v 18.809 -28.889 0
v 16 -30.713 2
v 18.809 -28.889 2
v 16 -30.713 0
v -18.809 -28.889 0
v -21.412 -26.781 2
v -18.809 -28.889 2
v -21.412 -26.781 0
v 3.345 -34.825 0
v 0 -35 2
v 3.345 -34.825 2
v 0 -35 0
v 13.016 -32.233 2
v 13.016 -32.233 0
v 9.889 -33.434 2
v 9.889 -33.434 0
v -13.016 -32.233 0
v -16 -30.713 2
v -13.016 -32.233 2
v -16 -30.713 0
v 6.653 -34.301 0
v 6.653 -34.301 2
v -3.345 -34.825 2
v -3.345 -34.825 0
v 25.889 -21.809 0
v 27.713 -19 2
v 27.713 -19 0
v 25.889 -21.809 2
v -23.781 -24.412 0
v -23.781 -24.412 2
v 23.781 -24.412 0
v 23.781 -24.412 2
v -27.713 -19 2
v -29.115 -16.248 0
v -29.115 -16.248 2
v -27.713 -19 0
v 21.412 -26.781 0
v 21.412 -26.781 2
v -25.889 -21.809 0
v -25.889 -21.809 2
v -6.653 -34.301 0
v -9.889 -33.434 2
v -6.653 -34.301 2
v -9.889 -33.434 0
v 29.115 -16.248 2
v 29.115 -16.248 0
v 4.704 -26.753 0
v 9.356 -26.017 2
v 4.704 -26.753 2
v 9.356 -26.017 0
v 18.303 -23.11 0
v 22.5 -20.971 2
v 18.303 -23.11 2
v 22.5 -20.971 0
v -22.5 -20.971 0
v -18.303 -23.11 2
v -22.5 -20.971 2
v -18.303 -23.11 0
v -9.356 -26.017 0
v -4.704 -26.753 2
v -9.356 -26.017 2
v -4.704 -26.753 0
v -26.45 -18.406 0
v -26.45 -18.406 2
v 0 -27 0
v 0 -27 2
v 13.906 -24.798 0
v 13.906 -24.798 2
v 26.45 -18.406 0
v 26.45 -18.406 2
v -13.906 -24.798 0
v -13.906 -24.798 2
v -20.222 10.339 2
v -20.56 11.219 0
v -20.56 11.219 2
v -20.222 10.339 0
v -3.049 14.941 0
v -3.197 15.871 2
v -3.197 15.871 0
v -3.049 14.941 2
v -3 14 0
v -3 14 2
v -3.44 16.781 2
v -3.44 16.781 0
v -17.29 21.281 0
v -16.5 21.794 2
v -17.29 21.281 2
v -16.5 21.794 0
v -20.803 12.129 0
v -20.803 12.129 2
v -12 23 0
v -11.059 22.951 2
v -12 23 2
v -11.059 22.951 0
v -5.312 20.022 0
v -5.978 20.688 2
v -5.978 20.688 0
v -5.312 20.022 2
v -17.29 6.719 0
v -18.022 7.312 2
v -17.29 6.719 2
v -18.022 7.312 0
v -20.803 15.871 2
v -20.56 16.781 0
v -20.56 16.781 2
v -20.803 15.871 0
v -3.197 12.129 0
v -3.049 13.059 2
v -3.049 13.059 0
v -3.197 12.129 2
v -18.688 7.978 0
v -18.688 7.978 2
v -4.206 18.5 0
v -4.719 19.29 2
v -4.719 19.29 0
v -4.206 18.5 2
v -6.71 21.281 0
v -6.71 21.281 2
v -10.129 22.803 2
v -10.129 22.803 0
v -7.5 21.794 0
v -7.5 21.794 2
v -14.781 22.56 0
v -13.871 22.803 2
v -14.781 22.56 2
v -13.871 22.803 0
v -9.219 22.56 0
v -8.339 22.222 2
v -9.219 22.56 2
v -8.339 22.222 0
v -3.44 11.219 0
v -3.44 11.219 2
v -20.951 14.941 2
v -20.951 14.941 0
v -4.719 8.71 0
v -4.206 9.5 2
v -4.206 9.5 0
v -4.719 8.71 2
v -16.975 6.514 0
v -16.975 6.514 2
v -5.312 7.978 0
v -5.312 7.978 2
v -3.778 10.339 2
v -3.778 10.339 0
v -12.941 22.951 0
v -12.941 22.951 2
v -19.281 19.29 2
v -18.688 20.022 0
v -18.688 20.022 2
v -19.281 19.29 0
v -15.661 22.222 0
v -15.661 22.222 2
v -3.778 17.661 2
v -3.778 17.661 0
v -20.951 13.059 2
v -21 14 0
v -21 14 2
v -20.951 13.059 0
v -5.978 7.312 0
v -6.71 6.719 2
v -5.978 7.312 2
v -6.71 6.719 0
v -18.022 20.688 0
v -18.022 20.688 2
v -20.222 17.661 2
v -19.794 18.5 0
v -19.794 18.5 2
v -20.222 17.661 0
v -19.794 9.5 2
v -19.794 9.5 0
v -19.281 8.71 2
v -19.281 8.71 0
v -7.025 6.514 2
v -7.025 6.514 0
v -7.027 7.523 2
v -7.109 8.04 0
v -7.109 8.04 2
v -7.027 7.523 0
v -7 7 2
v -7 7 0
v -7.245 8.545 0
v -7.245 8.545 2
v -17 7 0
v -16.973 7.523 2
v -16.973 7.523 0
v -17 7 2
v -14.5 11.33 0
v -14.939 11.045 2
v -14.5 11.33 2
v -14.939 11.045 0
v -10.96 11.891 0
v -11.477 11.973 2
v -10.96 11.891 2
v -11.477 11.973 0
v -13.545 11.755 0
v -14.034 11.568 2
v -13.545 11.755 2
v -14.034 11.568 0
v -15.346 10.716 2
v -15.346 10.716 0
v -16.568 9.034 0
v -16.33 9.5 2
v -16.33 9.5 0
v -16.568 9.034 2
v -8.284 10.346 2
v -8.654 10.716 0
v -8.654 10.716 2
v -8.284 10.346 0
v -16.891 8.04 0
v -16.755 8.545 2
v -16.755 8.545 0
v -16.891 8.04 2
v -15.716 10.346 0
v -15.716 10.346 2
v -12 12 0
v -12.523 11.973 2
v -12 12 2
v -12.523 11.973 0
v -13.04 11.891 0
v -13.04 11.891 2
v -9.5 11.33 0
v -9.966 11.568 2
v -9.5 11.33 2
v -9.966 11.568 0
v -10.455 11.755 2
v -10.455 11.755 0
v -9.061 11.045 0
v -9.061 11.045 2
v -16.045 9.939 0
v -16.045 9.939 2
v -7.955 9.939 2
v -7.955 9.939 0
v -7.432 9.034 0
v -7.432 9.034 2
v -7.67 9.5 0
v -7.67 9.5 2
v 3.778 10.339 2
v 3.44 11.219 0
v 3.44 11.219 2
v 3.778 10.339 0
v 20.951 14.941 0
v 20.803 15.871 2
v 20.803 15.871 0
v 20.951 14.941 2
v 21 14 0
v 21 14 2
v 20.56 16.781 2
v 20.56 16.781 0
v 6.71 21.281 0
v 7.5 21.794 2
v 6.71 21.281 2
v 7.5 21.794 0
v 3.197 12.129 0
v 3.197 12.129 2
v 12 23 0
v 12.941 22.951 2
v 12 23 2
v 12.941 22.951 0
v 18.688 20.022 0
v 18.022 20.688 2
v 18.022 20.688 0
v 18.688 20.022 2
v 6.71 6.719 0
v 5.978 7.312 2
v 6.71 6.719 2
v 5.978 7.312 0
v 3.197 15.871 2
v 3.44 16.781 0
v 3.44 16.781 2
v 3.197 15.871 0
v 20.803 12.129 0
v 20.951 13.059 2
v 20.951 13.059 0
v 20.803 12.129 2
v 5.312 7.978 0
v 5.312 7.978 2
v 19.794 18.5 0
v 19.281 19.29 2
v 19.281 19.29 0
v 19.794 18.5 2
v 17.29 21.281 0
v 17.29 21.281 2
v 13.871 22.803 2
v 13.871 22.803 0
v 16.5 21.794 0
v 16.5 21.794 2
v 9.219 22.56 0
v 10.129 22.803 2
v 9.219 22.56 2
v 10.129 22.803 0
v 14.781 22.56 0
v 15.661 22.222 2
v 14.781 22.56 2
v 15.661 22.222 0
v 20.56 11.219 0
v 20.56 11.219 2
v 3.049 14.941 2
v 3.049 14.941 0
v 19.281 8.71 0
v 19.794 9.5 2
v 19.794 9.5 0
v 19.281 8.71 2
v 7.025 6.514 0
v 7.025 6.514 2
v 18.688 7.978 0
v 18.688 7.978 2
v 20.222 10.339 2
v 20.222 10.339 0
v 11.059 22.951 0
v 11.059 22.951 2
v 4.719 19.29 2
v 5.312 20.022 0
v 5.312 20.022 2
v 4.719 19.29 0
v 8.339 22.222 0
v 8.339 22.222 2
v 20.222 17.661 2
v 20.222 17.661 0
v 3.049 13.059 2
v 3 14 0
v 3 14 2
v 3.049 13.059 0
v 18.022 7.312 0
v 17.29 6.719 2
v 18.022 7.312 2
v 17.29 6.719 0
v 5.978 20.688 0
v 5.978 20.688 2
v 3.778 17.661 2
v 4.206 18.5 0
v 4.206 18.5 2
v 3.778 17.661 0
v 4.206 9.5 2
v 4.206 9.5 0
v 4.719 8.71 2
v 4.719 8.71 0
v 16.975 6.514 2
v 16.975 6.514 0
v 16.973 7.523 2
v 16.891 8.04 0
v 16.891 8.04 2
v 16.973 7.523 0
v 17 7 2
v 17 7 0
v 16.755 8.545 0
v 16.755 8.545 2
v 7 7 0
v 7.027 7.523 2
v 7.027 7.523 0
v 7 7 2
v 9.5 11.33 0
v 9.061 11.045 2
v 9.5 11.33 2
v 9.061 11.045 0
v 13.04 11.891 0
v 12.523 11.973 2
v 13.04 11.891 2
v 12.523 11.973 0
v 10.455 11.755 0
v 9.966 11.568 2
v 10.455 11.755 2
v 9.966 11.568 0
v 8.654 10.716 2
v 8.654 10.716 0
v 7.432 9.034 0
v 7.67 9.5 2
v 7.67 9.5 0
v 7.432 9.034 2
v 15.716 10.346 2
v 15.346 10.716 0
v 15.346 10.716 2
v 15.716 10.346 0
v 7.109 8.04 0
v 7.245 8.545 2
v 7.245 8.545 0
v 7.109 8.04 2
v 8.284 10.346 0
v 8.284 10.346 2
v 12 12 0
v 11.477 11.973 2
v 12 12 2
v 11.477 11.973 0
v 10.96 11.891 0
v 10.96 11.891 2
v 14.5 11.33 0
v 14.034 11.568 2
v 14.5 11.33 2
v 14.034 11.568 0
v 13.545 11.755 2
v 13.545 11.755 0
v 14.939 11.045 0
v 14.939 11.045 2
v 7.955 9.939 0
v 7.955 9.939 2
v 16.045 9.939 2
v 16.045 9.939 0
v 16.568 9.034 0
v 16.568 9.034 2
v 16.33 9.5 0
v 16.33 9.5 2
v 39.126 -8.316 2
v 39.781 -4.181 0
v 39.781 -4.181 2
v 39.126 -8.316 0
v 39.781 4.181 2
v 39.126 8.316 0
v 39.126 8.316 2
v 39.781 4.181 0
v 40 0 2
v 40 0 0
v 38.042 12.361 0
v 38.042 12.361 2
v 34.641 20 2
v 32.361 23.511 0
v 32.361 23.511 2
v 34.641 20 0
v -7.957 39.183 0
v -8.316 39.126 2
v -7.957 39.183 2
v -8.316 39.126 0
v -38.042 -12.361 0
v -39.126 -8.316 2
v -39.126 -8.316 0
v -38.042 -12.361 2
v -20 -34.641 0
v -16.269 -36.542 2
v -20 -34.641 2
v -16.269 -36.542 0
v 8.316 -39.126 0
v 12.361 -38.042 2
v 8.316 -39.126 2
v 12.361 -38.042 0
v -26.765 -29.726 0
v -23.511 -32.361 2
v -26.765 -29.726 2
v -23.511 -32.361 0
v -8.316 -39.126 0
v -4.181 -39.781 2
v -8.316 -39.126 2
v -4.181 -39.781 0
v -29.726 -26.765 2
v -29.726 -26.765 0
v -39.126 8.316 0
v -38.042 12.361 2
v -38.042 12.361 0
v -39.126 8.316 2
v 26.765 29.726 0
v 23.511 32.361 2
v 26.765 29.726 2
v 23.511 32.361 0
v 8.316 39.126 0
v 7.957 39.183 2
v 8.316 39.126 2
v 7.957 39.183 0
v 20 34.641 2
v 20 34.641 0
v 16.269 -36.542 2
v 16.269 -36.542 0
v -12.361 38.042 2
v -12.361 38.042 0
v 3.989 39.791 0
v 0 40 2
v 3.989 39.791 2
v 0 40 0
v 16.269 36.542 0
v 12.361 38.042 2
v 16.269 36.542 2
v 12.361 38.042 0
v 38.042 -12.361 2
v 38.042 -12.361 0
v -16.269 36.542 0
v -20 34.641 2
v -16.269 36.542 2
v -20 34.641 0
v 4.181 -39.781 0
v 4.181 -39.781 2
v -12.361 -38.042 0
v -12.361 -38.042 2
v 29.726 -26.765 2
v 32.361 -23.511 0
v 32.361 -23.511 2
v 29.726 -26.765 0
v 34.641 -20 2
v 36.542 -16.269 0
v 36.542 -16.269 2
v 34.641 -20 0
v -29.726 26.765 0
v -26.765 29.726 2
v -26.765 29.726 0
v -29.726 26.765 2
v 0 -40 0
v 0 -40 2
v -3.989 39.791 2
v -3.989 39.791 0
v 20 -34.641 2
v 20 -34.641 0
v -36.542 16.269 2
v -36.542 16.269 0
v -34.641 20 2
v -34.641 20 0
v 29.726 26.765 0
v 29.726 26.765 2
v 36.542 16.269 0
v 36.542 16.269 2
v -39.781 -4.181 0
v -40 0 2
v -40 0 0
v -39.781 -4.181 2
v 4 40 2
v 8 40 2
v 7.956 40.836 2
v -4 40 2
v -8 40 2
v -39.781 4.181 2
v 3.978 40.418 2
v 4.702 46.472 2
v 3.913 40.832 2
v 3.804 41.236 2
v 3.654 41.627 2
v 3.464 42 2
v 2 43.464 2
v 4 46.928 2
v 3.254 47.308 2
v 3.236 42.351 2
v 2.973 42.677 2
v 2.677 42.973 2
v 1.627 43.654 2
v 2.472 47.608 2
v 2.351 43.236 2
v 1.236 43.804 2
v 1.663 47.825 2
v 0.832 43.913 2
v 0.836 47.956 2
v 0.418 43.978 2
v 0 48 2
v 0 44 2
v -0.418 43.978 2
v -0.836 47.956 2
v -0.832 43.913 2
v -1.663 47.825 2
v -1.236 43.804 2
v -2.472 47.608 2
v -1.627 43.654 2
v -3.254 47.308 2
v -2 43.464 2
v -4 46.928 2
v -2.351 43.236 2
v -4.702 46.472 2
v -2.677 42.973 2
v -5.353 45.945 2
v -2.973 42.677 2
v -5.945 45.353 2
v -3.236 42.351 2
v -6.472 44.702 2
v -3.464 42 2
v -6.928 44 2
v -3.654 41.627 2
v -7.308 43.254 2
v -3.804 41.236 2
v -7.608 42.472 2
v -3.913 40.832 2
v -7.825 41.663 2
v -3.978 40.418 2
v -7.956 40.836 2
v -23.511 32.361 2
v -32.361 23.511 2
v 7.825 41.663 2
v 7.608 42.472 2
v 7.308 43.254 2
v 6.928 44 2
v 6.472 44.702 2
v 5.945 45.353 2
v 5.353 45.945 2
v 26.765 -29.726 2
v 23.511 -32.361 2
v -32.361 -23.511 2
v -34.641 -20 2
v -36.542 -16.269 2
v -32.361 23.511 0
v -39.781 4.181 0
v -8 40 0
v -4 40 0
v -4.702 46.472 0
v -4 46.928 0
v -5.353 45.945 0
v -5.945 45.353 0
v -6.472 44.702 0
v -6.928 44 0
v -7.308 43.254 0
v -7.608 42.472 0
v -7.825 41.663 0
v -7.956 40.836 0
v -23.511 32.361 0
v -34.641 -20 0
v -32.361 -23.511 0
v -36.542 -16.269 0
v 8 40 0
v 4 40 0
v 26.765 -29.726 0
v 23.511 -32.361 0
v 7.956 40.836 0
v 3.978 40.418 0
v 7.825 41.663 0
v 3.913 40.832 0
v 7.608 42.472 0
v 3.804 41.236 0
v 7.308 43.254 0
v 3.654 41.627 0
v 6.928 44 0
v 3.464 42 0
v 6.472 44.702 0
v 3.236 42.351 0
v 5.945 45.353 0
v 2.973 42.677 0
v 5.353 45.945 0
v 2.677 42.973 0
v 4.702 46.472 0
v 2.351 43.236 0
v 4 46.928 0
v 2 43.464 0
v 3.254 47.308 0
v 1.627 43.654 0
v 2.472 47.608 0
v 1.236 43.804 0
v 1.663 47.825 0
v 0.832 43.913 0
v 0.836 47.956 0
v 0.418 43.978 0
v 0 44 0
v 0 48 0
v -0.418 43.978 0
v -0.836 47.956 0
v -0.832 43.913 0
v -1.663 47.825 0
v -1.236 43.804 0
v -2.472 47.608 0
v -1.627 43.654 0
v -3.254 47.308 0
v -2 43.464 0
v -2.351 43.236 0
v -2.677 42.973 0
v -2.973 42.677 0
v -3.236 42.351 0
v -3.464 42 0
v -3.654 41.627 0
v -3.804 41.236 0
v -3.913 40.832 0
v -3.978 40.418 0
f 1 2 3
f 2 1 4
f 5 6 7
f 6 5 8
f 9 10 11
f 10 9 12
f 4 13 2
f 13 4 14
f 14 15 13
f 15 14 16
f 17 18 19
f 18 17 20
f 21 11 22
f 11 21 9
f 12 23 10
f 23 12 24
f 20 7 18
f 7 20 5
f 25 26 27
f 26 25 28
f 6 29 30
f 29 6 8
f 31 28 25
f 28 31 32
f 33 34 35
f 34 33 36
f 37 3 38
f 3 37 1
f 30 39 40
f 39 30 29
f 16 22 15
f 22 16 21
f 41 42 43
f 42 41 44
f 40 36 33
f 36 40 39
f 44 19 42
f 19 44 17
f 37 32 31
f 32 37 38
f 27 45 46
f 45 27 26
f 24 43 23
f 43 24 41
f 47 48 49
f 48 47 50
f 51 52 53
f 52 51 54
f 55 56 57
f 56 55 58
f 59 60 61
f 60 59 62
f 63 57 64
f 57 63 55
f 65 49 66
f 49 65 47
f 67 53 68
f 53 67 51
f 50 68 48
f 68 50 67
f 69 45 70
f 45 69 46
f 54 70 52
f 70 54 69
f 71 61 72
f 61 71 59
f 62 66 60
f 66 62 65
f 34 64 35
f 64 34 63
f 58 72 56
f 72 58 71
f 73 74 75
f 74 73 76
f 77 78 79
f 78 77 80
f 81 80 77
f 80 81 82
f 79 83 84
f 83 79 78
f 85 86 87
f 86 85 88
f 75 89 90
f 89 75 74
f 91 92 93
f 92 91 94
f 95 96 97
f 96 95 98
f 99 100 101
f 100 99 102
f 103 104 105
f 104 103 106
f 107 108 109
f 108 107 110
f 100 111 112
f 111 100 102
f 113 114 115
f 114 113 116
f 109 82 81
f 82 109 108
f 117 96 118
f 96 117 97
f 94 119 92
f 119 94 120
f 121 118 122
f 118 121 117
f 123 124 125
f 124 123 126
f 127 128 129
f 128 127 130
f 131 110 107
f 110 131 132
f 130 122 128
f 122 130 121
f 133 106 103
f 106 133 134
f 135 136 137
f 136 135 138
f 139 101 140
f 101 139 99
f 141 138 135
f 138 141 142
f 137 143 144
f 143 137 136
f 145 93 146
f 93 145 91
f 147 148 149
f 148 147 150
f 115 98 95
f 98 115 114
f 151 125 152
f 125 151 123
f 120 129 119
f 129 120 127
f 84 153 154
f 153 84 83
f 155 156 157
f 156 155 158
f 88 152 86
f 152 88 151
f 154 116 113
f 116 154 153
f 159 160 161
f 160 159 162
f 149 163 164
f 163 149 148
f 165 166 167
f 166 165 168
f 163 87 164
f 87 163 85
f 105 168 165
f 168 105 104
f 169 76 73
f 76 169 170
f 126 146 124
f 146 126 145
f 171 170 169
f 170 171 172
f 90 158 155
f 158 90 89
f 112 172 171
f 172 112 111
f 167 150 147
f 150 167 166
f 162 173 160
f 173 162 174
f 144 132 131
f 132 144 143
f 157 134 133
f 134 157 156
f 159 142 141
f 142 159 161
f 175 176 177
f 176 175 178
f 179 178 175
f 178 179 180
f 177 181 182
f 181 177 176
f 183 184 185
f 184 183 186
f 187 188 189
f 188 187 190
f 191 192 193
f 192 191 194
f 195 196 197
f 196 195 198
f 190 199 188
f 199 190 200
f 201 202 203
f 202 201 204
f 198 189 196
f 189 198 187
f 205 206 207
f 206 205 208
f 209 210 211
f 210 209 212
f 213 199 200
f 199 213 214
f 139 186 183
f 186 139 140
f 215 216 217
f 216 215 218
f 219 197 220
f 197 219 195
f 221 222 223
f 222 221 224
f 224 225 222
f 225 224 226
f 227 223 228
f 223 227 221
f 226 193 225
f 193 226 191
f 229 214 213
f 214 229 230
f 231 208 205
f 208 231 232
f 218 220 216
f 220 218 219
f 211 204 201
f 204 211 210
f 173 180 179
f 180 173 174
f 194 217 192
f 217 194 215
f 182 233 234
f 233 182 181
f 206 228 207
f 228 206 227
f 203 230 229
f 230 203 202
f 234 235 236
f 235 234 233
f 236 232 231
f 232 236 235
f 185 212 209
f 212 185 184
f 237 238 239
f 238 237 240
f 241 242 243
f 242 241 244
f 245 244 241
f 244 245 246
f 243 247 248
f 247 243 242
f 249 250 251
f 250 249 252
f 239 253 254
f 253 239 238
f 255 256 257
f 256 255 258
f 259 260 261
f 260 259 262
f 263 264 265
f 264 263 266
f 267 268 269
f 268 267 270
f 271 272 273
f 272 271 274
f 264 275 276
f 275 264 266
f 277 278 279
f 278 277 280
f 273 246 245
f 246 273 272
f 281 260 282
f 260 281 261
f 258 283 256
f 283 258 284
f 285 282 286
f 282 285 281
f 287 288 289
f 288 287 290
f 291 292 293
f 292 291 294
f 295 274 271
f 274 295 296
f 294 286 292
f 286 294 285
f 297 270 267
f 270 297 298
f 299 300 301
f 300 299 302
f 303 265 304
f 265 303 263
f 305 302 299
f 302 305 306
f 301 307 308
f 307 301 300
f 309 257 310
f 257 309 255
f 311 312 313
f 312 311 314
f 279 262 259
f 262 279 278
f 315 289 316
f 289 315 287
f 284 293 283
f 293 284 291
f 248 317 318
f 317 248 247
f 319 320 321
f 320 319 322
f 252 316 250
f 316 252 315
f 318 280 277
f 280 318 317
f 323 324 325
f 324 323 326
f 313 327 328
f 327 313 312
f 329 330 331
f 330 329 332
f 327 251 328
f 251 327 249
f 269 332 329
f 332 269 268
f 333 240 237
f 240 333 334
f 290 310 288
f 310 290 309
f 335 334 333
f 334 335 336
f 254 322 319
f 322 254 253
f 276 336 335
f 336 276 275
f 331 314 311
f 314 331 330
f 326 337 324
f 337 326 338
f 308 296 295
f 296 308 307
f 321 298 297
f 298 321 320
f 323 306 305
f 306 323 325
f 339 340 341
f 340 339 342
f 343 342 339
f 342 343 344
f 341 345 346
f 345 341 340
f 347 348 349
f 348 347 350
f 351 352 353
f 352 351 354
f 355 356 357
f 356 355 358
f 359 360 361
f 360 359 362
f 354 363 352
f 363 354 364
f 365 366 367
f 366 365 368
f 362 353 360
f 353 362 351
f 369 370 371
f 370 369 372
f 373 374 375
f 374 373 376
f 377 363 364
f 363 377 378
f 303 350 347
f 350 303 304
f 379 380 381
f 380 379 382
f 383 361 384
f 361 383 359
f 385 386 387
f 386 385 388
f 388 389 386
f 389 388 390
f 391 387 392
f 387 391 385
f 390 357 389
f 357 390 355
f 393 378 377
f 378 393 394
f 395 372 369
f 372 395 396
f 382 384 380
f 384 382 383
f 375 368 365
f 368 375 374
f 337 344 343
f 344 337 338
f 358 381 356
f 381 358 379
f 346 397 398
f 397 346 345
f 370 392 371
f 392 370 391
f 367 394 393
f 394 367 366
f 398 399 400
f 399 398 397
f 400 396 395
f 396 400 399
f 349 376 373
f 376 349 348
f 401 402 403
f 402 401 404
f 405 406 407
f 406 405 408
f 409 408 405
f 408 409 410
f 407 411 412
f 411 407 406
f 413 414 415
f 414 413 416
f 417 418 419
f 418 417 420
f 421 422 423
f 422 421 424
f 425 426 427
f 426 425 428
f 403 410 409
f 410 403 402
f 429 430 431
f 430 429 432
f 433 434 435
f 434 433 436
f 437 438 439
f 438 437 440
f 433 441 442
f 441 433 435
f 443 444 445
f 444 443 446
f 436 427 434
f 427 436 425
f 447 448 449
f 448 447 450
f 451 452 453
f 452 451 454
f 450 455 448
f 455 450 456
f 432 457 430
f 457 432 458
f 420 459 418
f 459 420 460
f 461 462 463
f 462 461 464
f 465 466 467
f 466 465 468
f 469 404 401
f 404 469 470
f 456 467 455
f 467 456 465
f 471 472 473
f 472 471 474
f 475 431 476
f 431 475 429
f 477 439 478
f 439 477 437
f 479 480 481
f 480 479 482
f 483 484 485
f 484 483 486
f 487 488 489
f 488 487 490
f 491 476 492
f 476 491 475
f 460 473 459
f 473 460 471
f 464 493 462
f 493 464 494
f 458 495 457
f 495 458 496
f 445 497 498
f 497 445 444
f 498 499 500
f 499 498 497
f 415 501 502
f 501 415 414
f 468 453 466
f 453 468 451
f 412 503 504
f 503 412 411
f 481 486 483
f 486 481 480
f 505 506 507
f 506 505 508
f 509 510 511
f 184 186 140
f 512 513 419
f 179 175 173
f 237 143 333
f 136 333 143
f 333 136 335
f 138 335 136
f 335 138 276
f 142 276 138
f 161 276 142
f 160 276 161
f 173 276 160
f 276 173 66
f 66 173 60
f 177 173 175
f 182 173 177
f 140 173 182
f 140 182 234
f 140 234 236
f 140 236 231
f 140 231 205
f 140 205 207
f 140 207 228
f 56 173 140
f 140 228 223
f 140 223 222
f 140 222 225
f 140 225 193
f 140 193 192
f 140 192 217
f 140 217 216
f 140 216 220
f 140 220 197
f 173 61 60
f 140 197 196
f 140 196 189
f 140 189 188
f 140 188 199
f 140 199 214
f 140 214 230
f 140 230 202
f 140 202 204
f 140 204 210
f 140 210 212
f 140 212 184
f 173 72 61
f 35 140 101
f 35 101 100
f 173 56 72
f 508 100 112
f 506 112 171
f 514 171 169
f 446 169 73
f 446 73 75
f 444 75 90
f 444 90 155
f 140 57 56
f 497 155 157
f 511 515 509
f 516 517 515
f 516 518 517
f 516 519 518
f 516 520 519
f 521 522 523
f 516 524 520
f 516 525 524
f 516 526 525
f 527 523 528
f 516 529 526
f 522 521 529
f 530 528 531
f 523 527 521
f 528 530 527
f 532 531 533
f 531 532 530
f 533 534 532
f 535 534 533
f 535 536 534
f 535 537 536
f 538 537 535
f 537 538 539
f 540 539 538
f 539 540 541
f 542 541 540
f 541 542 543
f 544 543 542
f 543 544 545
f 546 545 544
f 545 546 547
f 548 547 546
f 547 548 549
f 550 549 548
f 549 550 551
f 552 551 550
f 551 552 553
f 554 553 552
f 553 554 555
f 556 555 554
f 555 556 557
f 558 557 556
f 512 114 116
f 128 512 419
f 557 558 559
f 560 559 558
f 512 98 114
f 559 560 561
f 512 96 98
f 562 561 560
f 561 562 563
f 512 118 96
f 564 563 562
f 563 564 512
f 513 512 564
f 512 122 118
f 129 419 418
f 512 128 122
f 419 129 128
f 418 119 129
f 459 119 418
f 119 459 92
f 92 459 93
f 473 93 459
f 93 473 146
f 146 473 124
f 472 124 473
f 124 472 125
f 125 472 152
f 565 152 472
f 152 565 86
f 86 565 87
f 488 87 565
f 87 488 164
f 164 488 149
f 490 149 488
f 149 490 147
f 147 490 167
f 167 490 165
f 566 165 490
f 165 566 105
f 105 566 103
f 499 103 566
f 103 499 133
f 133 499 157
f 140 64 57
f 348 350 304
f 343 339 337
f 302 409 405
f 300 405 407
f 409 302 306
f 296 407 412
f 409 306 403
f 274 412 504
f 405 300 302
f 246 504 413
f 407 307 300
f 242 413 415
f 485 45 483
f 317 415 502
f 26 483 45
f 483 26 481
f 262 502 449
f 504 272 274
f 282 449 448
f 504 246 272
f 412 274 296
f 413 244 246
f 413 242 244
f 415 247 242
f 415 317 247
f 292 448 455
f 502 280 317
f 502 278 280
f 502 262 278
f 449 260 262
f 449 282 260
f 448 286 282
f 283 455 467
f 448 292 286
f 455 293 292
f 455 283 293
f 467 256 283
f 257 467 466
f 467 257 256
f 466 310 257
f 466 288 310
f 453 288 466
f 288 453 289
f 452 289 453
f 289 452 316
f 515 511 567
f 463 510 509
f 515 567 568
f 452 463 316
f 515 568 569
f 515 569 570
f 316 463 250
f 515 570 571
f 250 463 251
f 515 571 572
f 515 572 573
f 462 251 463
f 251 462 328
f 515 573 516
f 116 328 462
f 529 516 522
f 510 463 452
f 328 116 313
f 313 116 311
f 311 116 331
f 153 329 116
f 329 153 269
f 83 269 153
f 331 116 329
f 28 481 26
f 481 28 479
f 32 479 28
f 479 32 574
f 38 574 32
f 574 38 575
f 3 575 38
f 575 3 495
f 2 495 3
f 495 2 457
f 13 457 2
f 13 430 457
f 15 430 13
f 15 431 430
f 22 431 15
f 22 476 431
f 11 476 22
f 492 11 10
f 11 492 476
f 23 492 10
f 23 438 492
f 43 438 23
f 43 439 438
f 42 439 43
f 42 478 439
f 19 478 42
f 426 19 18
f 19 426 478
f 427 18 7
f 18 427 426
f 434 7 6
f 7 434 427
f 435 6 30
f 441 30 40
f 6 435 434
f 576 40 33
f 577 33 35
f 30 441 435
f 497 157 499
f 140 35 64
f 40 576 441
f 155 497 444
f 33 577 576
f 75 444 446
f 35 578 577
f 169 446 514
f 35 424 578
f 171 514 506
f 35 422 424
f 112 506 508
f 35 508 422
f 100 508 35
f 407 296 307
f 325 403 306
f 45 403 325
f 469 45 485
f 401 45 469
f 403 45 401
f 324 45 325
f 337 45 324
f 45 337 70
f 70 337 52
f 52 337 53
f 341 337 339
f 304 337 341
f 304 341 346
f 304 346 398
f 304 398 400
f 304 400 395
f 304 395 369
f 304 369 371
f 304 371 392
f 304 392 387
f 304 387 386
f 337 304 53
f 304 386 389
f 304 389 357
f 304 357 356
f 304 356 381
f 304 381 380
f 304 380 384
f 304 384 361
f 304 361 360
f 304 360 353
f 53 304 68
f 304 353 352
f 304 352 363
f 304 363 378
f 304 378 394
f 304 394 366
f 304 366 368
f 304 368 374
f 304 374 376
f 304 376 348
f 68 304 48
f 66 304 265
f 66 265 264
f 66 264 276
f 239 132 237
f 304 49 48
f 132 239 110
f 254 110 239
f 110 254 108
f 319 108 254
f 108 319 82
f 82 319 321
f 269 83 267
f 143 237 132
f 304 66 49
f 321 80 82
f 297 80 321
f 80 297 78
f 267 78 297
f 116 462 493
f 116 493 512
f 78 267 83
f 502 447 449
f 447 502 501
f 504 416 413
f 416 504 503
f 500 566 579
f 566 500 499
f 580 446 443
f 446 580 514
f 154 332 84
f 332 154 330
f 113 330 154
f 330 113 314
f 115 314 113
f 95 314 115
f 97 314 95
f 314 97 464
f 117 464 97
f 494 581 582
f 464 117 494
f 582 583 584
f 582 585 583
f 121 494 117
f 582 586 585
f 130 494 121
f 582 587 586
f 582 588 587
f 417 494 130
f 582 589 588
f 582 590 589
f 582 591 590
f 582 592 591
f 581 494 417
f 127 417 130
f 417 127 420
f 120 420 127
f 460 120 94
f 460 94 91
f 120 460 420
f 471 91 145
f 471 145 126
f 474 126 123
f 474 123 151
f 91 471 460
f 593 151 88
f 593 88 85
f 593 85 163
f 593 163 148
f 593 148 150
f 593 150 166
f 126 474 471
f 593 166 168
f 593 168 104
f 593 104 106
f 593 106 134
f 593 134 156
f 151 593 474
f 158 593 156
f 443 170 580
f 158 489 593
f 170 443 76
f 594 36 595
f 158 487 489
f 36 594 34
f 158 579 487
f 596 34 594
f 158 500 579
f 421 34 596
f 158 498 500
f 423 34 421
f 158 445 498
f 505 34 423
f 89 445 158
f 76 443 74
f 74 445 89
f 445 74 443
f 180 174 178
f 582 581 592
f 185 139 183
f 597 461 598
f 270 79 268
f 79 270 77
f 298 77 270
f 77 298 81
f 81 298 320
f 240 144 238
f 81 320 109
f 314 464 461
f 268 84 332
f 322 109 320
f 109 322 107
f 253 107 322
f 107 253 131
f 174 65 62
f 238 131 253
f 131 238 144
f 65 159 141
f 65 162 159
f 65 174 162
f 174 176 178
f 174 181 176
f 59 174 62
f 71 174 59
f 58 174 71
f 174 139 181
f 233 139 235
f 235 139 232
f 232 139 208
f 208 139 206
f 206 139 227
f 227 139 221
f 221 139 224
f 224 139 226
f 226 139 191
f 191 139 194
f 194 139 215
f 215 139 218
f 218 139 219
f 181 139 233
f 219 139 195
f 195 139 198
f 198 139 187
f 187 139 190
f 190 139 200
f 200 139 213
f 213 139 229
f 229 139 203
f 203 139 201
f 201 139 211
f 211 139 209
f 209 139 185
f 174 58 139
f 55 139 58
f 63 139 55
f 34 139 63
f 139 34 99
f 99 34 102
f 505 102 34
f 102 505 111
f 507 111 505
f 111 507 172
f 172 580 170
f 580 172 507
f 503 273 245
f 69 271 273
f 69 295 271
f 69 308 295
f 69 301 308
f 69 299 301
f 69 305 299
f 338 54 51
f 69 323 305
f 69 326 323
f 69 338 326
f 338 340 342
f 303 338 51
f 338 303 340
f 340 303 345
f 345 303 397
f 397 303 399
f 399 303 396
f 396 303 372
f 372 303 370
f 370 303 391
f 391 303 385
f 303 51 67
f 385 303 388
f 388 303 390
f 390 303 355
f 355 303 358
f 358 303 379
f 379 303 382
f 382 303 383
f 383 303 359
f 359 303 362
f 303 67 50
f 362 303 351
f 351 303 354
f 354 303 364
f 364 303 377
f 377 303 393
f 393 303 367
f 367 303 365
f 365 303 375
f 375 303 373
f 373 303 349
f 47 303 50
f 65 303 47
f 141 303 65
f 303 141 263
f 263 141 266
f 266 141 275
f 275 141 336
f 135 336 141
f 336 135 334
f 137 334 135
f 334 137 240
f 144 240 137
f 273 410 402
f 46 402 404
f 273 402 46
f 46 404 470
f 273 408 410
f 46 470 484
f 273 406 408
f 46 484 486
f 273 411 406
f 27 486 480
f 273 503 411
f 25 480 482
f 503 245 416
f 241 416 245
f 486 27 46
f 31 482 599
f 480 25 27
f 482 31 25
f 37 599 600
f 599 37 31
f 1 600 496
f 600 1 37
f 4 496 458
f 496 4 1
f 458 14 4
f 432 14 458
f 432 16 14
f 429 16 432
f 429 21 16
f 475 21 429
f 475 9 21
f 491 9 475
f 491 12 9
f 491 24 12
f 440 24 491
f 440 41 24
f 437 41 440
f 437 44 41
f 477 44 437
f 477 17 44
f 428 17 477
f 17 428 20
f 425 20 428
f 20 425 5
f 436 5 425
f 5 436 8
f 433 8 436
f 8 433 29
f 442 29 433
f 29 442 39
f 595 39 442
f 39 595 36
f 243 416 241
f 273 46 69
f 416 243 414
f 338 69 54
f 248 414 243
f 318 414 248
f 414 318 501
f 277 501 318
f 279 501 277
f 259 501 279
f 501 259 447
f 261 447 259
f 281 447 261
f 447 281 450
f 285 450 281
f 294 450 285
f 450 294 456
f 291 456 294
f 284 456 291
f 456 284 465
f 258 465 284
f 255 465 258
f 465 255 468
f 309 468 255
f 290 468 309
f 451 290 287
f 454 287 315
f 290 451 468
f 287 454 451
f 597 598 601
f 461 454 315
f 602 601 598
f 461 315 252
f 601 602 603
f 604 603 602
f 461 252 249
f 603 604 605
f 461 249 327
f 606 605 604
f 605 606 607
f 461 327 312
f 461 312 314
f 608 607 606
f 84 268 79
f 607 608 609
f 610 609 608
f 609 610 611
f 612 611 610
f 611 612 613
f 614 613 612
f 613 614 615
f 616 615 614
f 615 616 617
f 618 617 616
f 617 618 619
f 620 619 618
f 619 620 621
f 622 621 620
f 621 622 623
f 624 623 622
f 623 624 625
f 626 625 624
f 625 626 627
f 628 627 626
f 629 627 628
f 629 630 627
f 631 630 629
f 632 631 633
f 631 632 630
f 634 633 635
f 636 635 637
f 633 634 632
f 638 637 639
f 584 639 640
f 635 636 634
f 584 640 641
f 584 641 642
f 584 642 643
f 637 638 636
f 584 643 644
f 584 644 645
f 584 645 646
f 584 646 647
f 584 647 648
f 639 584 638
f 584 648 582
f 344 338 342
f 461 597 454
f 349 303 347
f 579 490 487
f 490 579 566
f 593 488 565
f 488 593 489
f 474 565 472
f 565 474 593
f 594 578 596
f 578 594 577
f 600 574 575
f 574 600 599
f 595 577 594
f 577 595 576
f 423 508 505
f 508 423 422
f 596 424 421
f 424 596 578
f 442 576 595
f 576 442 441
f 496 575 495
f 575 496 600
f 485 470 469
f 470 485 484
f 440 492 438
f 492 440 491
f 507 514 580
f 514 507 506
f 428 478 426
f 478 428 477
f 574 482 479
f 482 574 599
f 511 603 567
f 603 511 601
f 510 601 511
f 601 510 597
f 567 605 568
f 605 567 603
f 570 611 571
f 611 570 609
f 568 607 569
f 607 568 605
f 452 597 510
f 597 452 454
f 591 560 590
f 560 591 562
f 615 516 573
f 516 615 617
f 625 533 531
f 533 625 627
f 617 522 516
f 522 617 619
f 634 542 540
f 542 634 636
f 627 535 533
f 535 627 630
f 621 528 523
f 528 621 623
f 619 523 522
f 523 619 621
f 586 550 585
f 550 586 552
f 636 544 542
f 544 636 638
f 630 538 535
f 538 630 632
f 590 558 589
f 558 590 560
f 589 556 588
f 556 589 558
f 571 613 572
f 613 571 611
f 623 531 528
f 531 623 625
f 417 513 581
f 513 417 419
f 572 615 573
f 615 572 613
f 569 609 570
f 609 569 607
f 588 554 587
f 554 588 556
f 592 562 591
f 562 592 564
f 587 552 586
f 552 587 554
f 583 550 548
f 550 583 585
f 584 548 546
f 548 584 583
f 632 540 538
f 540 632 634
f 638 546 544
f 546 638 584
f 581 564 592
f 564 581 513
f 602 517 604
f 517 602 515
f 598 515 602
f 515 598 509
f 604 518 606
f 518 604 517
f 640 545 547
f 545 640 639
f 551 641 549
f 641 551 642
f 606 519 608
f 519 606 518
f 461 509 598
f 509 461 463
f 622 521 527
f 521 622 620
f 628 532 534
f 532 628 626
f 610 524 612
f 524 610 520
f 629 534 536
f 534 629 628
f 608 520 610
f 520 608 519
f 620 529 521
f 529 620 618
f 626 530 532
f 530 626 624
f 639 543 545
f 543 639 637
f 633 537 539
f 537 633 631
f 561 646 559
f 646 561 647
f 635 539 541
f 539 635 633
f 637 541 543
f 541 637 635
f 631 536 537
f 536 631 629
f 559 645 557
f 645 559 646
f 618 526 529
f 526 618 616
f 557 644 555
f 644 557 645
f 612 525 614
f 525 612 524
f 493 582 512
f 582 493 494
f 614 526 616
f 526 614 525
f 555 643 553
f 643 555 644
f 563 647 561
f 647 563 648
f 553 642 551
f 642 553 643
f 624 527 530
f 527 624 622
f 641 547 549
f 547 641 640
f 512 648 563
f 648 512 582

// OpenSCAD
$fn=60;
union() {
	difference() {
		cylinder(h=2, d=80);
		difference() {
			translate([0, -3, -1]) cylinder(h=4, d=64);
			translate([0, 18, -2]) cylinder(h=6, d=90);
		}
		translate([-12, 14, -1])
			difference() {
				cylinder(h=4, d=18);
				translate([0, -7, -1]) cylinder(h=6, d=10);
			}
		translate([12, 14, -1])
			difference() {
				cylinder(h=4, d=18);
				translate([0, -7, -1]) cylinder(h=6, d=10);
			}
	}
	translate([0, 40])
		difference() {
			cylinder(h=2, d=16);
			translate([0, 0, -1]) cylinder(h=4, d=8);
		}
}
